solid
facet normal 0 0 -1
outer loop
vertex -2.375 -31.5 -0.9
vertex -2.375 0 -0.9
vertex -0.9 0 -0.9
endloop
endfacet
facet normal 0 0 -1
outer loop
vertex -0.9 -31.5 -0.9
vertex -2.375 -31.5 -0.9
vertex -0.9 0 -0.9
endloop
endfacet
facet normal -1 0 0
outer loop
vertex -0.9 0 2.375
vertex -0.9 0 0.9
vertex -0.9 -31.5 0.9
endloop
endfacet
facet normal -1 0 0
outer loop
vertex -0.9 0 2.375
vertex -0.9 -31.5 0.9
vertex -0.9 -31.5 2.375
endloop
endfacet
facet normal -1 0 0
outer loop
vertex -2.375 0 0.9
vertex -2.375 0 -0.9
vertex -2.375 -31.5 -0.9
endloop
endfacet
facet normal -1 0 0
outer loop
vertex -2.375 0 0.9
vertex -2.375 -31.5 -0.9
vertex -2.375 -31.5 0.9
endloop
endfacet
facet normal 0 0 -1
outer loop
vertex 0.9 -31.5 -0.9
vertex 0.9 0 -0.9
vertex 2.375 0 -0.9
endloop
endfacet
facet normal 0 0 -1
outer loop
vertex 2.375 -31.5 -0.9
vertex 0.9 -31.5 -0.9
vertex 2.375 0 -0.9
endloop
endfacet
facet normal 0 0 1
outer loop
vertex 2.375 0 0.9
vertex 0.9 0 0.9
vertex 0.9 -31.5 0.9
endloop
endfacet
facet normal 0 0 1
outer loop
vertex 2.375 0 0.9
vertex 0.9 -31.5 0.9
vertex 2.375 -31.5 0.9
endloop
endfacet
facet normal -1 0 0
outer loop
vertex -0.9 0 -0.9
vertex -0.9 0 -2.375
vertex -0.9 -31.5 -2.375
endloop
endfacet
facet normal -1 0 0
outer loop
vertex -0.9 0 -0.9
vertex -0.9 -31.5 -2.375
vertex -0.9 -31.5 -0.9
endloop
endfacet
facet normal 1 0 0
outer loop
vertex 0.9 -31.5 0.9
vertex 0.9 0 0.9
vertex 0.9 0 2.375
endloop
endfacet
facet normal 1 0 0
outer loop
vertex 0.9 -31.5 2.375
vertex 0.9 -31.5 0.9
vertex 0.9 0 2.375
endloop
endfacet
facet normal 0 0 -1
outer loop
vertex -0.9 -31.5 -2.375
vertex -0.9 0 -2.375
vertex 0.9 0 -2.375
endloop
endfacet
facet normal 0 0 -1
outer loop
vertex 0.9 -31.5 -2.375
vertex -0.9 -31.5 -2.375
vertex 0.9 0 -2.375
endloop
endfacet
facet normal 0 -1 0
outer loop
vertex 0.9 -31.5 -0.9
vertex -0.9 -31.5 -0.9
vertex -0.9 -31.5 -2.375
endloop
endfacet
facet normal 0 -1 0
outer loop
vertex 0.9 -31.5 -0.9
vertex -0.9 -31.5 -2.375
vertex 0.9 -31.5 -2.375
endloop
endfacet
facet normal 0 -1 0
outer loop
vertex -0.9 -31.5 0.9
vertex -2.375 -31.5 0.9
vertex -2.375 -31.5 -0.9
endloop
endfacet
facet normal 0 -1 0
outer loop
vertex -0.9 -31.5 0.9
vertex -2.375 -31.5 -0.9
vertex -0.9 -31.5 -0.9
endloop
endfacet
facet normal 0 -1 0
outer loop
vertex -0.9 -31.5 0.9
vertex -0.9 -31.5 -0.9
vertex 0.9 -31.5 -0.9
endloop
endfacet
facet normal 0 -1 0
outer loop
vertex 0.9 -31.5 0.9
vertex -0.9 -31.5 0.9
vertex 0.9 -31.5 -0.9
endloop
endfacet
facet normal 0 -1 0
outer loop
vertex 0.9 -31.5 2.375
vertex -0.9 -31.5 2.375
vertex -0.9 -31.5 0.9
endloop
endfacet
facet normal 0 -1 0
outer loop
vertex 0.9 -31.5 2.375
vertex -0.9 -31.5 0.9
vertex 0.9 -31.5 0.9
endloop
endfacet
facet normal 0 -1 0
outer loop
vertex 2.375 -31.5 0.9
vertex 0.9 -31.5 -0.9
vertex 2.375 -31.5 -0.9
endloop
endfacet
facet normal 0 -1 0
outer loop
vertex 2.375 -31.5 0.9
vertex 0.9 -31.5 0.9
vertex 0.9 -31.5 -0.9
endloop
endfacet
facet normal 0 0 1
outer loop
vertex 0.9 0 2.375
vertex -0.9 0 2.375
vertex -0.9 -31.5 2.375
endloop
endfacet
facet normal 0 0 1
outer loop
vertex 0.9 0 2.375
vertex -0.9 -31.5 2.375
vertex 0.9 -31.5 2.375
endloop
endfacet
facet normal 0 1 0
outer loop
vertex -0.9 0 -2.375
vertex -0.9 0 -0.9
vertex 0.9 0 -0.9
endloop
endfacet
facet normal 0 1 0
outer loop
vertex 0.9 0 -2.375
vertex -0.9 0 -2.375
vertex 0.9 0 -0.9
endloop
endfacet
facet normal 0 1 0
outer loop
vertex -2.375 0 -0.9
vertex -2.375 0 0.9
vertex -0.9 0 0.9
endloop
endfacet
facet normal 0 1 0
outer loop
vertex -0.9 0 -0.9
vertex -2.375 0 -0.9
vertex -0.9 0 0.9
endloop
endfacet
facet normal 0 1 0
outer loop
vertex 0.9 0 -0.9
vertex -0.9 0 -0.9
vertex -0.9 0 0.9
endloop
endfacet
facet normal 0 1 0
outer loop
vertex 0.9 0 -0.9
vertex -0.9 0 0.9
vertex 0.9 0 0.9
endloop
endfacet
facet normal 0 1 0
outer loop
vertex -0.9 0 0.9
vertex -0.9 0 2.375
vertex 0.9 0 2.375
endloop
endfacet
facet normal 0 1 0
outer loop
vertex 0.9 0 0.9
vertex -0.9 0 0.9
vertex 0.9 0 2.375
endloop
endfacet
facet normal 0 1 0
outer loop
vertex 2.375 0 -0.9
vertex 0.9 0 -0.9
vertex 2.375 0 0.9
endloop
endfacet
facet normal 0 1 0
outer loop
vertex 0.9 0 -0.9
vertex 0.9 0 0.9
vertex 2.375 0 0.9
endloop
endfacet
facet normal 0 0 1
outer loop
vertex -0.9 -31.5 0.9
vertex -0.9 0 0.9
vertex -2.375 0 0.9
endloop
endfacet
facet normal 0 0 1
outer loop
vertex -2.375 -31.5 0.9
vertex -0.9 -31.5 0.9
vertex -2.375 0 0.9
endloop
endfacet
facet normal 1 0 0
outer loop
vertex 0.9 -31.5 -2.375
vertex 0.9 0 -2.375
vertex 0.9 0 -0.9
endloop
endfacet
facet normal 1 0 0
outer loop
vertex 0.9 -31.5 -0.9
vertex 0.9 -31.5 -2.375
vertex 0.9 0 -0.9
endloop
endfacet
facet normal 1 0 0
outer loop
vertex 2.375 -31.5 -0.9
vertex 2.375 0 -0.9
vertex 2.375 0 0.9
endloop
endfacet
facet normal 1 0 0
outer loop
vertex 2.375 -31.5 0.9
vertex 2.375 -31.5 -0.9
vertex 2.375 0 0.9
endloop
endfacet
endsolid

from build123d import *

# Parameters (mm, degrees)
F0_W     = 1.8
F0_H     = 1.8
F0_W_2   = 1.475
F0_H_2   = 1.475
F1_DEPTH = 31.5


with BuildPart() as f1:
    # F0 (on Front) → F1 (new body)
    with BuildSketch(Plane.XZ):
        Rectangle(F0_W, F0_H)
        with Locations((-1.6375, 0)):
            Rectangle(F0_W_2, F0_H)
        with Locations((0, 1.6375)):
            Rectangle(F0_W, F0_H_2)
        with Locations((0, -1.6375)):
            Rectangle(F0_W, F0_H_2)
        with Locations((1.6375, 0)):
            Rectangle(F0_W_2, F0_H)
    extrude(amount=F1_DEPTH)


solid = f1.part
